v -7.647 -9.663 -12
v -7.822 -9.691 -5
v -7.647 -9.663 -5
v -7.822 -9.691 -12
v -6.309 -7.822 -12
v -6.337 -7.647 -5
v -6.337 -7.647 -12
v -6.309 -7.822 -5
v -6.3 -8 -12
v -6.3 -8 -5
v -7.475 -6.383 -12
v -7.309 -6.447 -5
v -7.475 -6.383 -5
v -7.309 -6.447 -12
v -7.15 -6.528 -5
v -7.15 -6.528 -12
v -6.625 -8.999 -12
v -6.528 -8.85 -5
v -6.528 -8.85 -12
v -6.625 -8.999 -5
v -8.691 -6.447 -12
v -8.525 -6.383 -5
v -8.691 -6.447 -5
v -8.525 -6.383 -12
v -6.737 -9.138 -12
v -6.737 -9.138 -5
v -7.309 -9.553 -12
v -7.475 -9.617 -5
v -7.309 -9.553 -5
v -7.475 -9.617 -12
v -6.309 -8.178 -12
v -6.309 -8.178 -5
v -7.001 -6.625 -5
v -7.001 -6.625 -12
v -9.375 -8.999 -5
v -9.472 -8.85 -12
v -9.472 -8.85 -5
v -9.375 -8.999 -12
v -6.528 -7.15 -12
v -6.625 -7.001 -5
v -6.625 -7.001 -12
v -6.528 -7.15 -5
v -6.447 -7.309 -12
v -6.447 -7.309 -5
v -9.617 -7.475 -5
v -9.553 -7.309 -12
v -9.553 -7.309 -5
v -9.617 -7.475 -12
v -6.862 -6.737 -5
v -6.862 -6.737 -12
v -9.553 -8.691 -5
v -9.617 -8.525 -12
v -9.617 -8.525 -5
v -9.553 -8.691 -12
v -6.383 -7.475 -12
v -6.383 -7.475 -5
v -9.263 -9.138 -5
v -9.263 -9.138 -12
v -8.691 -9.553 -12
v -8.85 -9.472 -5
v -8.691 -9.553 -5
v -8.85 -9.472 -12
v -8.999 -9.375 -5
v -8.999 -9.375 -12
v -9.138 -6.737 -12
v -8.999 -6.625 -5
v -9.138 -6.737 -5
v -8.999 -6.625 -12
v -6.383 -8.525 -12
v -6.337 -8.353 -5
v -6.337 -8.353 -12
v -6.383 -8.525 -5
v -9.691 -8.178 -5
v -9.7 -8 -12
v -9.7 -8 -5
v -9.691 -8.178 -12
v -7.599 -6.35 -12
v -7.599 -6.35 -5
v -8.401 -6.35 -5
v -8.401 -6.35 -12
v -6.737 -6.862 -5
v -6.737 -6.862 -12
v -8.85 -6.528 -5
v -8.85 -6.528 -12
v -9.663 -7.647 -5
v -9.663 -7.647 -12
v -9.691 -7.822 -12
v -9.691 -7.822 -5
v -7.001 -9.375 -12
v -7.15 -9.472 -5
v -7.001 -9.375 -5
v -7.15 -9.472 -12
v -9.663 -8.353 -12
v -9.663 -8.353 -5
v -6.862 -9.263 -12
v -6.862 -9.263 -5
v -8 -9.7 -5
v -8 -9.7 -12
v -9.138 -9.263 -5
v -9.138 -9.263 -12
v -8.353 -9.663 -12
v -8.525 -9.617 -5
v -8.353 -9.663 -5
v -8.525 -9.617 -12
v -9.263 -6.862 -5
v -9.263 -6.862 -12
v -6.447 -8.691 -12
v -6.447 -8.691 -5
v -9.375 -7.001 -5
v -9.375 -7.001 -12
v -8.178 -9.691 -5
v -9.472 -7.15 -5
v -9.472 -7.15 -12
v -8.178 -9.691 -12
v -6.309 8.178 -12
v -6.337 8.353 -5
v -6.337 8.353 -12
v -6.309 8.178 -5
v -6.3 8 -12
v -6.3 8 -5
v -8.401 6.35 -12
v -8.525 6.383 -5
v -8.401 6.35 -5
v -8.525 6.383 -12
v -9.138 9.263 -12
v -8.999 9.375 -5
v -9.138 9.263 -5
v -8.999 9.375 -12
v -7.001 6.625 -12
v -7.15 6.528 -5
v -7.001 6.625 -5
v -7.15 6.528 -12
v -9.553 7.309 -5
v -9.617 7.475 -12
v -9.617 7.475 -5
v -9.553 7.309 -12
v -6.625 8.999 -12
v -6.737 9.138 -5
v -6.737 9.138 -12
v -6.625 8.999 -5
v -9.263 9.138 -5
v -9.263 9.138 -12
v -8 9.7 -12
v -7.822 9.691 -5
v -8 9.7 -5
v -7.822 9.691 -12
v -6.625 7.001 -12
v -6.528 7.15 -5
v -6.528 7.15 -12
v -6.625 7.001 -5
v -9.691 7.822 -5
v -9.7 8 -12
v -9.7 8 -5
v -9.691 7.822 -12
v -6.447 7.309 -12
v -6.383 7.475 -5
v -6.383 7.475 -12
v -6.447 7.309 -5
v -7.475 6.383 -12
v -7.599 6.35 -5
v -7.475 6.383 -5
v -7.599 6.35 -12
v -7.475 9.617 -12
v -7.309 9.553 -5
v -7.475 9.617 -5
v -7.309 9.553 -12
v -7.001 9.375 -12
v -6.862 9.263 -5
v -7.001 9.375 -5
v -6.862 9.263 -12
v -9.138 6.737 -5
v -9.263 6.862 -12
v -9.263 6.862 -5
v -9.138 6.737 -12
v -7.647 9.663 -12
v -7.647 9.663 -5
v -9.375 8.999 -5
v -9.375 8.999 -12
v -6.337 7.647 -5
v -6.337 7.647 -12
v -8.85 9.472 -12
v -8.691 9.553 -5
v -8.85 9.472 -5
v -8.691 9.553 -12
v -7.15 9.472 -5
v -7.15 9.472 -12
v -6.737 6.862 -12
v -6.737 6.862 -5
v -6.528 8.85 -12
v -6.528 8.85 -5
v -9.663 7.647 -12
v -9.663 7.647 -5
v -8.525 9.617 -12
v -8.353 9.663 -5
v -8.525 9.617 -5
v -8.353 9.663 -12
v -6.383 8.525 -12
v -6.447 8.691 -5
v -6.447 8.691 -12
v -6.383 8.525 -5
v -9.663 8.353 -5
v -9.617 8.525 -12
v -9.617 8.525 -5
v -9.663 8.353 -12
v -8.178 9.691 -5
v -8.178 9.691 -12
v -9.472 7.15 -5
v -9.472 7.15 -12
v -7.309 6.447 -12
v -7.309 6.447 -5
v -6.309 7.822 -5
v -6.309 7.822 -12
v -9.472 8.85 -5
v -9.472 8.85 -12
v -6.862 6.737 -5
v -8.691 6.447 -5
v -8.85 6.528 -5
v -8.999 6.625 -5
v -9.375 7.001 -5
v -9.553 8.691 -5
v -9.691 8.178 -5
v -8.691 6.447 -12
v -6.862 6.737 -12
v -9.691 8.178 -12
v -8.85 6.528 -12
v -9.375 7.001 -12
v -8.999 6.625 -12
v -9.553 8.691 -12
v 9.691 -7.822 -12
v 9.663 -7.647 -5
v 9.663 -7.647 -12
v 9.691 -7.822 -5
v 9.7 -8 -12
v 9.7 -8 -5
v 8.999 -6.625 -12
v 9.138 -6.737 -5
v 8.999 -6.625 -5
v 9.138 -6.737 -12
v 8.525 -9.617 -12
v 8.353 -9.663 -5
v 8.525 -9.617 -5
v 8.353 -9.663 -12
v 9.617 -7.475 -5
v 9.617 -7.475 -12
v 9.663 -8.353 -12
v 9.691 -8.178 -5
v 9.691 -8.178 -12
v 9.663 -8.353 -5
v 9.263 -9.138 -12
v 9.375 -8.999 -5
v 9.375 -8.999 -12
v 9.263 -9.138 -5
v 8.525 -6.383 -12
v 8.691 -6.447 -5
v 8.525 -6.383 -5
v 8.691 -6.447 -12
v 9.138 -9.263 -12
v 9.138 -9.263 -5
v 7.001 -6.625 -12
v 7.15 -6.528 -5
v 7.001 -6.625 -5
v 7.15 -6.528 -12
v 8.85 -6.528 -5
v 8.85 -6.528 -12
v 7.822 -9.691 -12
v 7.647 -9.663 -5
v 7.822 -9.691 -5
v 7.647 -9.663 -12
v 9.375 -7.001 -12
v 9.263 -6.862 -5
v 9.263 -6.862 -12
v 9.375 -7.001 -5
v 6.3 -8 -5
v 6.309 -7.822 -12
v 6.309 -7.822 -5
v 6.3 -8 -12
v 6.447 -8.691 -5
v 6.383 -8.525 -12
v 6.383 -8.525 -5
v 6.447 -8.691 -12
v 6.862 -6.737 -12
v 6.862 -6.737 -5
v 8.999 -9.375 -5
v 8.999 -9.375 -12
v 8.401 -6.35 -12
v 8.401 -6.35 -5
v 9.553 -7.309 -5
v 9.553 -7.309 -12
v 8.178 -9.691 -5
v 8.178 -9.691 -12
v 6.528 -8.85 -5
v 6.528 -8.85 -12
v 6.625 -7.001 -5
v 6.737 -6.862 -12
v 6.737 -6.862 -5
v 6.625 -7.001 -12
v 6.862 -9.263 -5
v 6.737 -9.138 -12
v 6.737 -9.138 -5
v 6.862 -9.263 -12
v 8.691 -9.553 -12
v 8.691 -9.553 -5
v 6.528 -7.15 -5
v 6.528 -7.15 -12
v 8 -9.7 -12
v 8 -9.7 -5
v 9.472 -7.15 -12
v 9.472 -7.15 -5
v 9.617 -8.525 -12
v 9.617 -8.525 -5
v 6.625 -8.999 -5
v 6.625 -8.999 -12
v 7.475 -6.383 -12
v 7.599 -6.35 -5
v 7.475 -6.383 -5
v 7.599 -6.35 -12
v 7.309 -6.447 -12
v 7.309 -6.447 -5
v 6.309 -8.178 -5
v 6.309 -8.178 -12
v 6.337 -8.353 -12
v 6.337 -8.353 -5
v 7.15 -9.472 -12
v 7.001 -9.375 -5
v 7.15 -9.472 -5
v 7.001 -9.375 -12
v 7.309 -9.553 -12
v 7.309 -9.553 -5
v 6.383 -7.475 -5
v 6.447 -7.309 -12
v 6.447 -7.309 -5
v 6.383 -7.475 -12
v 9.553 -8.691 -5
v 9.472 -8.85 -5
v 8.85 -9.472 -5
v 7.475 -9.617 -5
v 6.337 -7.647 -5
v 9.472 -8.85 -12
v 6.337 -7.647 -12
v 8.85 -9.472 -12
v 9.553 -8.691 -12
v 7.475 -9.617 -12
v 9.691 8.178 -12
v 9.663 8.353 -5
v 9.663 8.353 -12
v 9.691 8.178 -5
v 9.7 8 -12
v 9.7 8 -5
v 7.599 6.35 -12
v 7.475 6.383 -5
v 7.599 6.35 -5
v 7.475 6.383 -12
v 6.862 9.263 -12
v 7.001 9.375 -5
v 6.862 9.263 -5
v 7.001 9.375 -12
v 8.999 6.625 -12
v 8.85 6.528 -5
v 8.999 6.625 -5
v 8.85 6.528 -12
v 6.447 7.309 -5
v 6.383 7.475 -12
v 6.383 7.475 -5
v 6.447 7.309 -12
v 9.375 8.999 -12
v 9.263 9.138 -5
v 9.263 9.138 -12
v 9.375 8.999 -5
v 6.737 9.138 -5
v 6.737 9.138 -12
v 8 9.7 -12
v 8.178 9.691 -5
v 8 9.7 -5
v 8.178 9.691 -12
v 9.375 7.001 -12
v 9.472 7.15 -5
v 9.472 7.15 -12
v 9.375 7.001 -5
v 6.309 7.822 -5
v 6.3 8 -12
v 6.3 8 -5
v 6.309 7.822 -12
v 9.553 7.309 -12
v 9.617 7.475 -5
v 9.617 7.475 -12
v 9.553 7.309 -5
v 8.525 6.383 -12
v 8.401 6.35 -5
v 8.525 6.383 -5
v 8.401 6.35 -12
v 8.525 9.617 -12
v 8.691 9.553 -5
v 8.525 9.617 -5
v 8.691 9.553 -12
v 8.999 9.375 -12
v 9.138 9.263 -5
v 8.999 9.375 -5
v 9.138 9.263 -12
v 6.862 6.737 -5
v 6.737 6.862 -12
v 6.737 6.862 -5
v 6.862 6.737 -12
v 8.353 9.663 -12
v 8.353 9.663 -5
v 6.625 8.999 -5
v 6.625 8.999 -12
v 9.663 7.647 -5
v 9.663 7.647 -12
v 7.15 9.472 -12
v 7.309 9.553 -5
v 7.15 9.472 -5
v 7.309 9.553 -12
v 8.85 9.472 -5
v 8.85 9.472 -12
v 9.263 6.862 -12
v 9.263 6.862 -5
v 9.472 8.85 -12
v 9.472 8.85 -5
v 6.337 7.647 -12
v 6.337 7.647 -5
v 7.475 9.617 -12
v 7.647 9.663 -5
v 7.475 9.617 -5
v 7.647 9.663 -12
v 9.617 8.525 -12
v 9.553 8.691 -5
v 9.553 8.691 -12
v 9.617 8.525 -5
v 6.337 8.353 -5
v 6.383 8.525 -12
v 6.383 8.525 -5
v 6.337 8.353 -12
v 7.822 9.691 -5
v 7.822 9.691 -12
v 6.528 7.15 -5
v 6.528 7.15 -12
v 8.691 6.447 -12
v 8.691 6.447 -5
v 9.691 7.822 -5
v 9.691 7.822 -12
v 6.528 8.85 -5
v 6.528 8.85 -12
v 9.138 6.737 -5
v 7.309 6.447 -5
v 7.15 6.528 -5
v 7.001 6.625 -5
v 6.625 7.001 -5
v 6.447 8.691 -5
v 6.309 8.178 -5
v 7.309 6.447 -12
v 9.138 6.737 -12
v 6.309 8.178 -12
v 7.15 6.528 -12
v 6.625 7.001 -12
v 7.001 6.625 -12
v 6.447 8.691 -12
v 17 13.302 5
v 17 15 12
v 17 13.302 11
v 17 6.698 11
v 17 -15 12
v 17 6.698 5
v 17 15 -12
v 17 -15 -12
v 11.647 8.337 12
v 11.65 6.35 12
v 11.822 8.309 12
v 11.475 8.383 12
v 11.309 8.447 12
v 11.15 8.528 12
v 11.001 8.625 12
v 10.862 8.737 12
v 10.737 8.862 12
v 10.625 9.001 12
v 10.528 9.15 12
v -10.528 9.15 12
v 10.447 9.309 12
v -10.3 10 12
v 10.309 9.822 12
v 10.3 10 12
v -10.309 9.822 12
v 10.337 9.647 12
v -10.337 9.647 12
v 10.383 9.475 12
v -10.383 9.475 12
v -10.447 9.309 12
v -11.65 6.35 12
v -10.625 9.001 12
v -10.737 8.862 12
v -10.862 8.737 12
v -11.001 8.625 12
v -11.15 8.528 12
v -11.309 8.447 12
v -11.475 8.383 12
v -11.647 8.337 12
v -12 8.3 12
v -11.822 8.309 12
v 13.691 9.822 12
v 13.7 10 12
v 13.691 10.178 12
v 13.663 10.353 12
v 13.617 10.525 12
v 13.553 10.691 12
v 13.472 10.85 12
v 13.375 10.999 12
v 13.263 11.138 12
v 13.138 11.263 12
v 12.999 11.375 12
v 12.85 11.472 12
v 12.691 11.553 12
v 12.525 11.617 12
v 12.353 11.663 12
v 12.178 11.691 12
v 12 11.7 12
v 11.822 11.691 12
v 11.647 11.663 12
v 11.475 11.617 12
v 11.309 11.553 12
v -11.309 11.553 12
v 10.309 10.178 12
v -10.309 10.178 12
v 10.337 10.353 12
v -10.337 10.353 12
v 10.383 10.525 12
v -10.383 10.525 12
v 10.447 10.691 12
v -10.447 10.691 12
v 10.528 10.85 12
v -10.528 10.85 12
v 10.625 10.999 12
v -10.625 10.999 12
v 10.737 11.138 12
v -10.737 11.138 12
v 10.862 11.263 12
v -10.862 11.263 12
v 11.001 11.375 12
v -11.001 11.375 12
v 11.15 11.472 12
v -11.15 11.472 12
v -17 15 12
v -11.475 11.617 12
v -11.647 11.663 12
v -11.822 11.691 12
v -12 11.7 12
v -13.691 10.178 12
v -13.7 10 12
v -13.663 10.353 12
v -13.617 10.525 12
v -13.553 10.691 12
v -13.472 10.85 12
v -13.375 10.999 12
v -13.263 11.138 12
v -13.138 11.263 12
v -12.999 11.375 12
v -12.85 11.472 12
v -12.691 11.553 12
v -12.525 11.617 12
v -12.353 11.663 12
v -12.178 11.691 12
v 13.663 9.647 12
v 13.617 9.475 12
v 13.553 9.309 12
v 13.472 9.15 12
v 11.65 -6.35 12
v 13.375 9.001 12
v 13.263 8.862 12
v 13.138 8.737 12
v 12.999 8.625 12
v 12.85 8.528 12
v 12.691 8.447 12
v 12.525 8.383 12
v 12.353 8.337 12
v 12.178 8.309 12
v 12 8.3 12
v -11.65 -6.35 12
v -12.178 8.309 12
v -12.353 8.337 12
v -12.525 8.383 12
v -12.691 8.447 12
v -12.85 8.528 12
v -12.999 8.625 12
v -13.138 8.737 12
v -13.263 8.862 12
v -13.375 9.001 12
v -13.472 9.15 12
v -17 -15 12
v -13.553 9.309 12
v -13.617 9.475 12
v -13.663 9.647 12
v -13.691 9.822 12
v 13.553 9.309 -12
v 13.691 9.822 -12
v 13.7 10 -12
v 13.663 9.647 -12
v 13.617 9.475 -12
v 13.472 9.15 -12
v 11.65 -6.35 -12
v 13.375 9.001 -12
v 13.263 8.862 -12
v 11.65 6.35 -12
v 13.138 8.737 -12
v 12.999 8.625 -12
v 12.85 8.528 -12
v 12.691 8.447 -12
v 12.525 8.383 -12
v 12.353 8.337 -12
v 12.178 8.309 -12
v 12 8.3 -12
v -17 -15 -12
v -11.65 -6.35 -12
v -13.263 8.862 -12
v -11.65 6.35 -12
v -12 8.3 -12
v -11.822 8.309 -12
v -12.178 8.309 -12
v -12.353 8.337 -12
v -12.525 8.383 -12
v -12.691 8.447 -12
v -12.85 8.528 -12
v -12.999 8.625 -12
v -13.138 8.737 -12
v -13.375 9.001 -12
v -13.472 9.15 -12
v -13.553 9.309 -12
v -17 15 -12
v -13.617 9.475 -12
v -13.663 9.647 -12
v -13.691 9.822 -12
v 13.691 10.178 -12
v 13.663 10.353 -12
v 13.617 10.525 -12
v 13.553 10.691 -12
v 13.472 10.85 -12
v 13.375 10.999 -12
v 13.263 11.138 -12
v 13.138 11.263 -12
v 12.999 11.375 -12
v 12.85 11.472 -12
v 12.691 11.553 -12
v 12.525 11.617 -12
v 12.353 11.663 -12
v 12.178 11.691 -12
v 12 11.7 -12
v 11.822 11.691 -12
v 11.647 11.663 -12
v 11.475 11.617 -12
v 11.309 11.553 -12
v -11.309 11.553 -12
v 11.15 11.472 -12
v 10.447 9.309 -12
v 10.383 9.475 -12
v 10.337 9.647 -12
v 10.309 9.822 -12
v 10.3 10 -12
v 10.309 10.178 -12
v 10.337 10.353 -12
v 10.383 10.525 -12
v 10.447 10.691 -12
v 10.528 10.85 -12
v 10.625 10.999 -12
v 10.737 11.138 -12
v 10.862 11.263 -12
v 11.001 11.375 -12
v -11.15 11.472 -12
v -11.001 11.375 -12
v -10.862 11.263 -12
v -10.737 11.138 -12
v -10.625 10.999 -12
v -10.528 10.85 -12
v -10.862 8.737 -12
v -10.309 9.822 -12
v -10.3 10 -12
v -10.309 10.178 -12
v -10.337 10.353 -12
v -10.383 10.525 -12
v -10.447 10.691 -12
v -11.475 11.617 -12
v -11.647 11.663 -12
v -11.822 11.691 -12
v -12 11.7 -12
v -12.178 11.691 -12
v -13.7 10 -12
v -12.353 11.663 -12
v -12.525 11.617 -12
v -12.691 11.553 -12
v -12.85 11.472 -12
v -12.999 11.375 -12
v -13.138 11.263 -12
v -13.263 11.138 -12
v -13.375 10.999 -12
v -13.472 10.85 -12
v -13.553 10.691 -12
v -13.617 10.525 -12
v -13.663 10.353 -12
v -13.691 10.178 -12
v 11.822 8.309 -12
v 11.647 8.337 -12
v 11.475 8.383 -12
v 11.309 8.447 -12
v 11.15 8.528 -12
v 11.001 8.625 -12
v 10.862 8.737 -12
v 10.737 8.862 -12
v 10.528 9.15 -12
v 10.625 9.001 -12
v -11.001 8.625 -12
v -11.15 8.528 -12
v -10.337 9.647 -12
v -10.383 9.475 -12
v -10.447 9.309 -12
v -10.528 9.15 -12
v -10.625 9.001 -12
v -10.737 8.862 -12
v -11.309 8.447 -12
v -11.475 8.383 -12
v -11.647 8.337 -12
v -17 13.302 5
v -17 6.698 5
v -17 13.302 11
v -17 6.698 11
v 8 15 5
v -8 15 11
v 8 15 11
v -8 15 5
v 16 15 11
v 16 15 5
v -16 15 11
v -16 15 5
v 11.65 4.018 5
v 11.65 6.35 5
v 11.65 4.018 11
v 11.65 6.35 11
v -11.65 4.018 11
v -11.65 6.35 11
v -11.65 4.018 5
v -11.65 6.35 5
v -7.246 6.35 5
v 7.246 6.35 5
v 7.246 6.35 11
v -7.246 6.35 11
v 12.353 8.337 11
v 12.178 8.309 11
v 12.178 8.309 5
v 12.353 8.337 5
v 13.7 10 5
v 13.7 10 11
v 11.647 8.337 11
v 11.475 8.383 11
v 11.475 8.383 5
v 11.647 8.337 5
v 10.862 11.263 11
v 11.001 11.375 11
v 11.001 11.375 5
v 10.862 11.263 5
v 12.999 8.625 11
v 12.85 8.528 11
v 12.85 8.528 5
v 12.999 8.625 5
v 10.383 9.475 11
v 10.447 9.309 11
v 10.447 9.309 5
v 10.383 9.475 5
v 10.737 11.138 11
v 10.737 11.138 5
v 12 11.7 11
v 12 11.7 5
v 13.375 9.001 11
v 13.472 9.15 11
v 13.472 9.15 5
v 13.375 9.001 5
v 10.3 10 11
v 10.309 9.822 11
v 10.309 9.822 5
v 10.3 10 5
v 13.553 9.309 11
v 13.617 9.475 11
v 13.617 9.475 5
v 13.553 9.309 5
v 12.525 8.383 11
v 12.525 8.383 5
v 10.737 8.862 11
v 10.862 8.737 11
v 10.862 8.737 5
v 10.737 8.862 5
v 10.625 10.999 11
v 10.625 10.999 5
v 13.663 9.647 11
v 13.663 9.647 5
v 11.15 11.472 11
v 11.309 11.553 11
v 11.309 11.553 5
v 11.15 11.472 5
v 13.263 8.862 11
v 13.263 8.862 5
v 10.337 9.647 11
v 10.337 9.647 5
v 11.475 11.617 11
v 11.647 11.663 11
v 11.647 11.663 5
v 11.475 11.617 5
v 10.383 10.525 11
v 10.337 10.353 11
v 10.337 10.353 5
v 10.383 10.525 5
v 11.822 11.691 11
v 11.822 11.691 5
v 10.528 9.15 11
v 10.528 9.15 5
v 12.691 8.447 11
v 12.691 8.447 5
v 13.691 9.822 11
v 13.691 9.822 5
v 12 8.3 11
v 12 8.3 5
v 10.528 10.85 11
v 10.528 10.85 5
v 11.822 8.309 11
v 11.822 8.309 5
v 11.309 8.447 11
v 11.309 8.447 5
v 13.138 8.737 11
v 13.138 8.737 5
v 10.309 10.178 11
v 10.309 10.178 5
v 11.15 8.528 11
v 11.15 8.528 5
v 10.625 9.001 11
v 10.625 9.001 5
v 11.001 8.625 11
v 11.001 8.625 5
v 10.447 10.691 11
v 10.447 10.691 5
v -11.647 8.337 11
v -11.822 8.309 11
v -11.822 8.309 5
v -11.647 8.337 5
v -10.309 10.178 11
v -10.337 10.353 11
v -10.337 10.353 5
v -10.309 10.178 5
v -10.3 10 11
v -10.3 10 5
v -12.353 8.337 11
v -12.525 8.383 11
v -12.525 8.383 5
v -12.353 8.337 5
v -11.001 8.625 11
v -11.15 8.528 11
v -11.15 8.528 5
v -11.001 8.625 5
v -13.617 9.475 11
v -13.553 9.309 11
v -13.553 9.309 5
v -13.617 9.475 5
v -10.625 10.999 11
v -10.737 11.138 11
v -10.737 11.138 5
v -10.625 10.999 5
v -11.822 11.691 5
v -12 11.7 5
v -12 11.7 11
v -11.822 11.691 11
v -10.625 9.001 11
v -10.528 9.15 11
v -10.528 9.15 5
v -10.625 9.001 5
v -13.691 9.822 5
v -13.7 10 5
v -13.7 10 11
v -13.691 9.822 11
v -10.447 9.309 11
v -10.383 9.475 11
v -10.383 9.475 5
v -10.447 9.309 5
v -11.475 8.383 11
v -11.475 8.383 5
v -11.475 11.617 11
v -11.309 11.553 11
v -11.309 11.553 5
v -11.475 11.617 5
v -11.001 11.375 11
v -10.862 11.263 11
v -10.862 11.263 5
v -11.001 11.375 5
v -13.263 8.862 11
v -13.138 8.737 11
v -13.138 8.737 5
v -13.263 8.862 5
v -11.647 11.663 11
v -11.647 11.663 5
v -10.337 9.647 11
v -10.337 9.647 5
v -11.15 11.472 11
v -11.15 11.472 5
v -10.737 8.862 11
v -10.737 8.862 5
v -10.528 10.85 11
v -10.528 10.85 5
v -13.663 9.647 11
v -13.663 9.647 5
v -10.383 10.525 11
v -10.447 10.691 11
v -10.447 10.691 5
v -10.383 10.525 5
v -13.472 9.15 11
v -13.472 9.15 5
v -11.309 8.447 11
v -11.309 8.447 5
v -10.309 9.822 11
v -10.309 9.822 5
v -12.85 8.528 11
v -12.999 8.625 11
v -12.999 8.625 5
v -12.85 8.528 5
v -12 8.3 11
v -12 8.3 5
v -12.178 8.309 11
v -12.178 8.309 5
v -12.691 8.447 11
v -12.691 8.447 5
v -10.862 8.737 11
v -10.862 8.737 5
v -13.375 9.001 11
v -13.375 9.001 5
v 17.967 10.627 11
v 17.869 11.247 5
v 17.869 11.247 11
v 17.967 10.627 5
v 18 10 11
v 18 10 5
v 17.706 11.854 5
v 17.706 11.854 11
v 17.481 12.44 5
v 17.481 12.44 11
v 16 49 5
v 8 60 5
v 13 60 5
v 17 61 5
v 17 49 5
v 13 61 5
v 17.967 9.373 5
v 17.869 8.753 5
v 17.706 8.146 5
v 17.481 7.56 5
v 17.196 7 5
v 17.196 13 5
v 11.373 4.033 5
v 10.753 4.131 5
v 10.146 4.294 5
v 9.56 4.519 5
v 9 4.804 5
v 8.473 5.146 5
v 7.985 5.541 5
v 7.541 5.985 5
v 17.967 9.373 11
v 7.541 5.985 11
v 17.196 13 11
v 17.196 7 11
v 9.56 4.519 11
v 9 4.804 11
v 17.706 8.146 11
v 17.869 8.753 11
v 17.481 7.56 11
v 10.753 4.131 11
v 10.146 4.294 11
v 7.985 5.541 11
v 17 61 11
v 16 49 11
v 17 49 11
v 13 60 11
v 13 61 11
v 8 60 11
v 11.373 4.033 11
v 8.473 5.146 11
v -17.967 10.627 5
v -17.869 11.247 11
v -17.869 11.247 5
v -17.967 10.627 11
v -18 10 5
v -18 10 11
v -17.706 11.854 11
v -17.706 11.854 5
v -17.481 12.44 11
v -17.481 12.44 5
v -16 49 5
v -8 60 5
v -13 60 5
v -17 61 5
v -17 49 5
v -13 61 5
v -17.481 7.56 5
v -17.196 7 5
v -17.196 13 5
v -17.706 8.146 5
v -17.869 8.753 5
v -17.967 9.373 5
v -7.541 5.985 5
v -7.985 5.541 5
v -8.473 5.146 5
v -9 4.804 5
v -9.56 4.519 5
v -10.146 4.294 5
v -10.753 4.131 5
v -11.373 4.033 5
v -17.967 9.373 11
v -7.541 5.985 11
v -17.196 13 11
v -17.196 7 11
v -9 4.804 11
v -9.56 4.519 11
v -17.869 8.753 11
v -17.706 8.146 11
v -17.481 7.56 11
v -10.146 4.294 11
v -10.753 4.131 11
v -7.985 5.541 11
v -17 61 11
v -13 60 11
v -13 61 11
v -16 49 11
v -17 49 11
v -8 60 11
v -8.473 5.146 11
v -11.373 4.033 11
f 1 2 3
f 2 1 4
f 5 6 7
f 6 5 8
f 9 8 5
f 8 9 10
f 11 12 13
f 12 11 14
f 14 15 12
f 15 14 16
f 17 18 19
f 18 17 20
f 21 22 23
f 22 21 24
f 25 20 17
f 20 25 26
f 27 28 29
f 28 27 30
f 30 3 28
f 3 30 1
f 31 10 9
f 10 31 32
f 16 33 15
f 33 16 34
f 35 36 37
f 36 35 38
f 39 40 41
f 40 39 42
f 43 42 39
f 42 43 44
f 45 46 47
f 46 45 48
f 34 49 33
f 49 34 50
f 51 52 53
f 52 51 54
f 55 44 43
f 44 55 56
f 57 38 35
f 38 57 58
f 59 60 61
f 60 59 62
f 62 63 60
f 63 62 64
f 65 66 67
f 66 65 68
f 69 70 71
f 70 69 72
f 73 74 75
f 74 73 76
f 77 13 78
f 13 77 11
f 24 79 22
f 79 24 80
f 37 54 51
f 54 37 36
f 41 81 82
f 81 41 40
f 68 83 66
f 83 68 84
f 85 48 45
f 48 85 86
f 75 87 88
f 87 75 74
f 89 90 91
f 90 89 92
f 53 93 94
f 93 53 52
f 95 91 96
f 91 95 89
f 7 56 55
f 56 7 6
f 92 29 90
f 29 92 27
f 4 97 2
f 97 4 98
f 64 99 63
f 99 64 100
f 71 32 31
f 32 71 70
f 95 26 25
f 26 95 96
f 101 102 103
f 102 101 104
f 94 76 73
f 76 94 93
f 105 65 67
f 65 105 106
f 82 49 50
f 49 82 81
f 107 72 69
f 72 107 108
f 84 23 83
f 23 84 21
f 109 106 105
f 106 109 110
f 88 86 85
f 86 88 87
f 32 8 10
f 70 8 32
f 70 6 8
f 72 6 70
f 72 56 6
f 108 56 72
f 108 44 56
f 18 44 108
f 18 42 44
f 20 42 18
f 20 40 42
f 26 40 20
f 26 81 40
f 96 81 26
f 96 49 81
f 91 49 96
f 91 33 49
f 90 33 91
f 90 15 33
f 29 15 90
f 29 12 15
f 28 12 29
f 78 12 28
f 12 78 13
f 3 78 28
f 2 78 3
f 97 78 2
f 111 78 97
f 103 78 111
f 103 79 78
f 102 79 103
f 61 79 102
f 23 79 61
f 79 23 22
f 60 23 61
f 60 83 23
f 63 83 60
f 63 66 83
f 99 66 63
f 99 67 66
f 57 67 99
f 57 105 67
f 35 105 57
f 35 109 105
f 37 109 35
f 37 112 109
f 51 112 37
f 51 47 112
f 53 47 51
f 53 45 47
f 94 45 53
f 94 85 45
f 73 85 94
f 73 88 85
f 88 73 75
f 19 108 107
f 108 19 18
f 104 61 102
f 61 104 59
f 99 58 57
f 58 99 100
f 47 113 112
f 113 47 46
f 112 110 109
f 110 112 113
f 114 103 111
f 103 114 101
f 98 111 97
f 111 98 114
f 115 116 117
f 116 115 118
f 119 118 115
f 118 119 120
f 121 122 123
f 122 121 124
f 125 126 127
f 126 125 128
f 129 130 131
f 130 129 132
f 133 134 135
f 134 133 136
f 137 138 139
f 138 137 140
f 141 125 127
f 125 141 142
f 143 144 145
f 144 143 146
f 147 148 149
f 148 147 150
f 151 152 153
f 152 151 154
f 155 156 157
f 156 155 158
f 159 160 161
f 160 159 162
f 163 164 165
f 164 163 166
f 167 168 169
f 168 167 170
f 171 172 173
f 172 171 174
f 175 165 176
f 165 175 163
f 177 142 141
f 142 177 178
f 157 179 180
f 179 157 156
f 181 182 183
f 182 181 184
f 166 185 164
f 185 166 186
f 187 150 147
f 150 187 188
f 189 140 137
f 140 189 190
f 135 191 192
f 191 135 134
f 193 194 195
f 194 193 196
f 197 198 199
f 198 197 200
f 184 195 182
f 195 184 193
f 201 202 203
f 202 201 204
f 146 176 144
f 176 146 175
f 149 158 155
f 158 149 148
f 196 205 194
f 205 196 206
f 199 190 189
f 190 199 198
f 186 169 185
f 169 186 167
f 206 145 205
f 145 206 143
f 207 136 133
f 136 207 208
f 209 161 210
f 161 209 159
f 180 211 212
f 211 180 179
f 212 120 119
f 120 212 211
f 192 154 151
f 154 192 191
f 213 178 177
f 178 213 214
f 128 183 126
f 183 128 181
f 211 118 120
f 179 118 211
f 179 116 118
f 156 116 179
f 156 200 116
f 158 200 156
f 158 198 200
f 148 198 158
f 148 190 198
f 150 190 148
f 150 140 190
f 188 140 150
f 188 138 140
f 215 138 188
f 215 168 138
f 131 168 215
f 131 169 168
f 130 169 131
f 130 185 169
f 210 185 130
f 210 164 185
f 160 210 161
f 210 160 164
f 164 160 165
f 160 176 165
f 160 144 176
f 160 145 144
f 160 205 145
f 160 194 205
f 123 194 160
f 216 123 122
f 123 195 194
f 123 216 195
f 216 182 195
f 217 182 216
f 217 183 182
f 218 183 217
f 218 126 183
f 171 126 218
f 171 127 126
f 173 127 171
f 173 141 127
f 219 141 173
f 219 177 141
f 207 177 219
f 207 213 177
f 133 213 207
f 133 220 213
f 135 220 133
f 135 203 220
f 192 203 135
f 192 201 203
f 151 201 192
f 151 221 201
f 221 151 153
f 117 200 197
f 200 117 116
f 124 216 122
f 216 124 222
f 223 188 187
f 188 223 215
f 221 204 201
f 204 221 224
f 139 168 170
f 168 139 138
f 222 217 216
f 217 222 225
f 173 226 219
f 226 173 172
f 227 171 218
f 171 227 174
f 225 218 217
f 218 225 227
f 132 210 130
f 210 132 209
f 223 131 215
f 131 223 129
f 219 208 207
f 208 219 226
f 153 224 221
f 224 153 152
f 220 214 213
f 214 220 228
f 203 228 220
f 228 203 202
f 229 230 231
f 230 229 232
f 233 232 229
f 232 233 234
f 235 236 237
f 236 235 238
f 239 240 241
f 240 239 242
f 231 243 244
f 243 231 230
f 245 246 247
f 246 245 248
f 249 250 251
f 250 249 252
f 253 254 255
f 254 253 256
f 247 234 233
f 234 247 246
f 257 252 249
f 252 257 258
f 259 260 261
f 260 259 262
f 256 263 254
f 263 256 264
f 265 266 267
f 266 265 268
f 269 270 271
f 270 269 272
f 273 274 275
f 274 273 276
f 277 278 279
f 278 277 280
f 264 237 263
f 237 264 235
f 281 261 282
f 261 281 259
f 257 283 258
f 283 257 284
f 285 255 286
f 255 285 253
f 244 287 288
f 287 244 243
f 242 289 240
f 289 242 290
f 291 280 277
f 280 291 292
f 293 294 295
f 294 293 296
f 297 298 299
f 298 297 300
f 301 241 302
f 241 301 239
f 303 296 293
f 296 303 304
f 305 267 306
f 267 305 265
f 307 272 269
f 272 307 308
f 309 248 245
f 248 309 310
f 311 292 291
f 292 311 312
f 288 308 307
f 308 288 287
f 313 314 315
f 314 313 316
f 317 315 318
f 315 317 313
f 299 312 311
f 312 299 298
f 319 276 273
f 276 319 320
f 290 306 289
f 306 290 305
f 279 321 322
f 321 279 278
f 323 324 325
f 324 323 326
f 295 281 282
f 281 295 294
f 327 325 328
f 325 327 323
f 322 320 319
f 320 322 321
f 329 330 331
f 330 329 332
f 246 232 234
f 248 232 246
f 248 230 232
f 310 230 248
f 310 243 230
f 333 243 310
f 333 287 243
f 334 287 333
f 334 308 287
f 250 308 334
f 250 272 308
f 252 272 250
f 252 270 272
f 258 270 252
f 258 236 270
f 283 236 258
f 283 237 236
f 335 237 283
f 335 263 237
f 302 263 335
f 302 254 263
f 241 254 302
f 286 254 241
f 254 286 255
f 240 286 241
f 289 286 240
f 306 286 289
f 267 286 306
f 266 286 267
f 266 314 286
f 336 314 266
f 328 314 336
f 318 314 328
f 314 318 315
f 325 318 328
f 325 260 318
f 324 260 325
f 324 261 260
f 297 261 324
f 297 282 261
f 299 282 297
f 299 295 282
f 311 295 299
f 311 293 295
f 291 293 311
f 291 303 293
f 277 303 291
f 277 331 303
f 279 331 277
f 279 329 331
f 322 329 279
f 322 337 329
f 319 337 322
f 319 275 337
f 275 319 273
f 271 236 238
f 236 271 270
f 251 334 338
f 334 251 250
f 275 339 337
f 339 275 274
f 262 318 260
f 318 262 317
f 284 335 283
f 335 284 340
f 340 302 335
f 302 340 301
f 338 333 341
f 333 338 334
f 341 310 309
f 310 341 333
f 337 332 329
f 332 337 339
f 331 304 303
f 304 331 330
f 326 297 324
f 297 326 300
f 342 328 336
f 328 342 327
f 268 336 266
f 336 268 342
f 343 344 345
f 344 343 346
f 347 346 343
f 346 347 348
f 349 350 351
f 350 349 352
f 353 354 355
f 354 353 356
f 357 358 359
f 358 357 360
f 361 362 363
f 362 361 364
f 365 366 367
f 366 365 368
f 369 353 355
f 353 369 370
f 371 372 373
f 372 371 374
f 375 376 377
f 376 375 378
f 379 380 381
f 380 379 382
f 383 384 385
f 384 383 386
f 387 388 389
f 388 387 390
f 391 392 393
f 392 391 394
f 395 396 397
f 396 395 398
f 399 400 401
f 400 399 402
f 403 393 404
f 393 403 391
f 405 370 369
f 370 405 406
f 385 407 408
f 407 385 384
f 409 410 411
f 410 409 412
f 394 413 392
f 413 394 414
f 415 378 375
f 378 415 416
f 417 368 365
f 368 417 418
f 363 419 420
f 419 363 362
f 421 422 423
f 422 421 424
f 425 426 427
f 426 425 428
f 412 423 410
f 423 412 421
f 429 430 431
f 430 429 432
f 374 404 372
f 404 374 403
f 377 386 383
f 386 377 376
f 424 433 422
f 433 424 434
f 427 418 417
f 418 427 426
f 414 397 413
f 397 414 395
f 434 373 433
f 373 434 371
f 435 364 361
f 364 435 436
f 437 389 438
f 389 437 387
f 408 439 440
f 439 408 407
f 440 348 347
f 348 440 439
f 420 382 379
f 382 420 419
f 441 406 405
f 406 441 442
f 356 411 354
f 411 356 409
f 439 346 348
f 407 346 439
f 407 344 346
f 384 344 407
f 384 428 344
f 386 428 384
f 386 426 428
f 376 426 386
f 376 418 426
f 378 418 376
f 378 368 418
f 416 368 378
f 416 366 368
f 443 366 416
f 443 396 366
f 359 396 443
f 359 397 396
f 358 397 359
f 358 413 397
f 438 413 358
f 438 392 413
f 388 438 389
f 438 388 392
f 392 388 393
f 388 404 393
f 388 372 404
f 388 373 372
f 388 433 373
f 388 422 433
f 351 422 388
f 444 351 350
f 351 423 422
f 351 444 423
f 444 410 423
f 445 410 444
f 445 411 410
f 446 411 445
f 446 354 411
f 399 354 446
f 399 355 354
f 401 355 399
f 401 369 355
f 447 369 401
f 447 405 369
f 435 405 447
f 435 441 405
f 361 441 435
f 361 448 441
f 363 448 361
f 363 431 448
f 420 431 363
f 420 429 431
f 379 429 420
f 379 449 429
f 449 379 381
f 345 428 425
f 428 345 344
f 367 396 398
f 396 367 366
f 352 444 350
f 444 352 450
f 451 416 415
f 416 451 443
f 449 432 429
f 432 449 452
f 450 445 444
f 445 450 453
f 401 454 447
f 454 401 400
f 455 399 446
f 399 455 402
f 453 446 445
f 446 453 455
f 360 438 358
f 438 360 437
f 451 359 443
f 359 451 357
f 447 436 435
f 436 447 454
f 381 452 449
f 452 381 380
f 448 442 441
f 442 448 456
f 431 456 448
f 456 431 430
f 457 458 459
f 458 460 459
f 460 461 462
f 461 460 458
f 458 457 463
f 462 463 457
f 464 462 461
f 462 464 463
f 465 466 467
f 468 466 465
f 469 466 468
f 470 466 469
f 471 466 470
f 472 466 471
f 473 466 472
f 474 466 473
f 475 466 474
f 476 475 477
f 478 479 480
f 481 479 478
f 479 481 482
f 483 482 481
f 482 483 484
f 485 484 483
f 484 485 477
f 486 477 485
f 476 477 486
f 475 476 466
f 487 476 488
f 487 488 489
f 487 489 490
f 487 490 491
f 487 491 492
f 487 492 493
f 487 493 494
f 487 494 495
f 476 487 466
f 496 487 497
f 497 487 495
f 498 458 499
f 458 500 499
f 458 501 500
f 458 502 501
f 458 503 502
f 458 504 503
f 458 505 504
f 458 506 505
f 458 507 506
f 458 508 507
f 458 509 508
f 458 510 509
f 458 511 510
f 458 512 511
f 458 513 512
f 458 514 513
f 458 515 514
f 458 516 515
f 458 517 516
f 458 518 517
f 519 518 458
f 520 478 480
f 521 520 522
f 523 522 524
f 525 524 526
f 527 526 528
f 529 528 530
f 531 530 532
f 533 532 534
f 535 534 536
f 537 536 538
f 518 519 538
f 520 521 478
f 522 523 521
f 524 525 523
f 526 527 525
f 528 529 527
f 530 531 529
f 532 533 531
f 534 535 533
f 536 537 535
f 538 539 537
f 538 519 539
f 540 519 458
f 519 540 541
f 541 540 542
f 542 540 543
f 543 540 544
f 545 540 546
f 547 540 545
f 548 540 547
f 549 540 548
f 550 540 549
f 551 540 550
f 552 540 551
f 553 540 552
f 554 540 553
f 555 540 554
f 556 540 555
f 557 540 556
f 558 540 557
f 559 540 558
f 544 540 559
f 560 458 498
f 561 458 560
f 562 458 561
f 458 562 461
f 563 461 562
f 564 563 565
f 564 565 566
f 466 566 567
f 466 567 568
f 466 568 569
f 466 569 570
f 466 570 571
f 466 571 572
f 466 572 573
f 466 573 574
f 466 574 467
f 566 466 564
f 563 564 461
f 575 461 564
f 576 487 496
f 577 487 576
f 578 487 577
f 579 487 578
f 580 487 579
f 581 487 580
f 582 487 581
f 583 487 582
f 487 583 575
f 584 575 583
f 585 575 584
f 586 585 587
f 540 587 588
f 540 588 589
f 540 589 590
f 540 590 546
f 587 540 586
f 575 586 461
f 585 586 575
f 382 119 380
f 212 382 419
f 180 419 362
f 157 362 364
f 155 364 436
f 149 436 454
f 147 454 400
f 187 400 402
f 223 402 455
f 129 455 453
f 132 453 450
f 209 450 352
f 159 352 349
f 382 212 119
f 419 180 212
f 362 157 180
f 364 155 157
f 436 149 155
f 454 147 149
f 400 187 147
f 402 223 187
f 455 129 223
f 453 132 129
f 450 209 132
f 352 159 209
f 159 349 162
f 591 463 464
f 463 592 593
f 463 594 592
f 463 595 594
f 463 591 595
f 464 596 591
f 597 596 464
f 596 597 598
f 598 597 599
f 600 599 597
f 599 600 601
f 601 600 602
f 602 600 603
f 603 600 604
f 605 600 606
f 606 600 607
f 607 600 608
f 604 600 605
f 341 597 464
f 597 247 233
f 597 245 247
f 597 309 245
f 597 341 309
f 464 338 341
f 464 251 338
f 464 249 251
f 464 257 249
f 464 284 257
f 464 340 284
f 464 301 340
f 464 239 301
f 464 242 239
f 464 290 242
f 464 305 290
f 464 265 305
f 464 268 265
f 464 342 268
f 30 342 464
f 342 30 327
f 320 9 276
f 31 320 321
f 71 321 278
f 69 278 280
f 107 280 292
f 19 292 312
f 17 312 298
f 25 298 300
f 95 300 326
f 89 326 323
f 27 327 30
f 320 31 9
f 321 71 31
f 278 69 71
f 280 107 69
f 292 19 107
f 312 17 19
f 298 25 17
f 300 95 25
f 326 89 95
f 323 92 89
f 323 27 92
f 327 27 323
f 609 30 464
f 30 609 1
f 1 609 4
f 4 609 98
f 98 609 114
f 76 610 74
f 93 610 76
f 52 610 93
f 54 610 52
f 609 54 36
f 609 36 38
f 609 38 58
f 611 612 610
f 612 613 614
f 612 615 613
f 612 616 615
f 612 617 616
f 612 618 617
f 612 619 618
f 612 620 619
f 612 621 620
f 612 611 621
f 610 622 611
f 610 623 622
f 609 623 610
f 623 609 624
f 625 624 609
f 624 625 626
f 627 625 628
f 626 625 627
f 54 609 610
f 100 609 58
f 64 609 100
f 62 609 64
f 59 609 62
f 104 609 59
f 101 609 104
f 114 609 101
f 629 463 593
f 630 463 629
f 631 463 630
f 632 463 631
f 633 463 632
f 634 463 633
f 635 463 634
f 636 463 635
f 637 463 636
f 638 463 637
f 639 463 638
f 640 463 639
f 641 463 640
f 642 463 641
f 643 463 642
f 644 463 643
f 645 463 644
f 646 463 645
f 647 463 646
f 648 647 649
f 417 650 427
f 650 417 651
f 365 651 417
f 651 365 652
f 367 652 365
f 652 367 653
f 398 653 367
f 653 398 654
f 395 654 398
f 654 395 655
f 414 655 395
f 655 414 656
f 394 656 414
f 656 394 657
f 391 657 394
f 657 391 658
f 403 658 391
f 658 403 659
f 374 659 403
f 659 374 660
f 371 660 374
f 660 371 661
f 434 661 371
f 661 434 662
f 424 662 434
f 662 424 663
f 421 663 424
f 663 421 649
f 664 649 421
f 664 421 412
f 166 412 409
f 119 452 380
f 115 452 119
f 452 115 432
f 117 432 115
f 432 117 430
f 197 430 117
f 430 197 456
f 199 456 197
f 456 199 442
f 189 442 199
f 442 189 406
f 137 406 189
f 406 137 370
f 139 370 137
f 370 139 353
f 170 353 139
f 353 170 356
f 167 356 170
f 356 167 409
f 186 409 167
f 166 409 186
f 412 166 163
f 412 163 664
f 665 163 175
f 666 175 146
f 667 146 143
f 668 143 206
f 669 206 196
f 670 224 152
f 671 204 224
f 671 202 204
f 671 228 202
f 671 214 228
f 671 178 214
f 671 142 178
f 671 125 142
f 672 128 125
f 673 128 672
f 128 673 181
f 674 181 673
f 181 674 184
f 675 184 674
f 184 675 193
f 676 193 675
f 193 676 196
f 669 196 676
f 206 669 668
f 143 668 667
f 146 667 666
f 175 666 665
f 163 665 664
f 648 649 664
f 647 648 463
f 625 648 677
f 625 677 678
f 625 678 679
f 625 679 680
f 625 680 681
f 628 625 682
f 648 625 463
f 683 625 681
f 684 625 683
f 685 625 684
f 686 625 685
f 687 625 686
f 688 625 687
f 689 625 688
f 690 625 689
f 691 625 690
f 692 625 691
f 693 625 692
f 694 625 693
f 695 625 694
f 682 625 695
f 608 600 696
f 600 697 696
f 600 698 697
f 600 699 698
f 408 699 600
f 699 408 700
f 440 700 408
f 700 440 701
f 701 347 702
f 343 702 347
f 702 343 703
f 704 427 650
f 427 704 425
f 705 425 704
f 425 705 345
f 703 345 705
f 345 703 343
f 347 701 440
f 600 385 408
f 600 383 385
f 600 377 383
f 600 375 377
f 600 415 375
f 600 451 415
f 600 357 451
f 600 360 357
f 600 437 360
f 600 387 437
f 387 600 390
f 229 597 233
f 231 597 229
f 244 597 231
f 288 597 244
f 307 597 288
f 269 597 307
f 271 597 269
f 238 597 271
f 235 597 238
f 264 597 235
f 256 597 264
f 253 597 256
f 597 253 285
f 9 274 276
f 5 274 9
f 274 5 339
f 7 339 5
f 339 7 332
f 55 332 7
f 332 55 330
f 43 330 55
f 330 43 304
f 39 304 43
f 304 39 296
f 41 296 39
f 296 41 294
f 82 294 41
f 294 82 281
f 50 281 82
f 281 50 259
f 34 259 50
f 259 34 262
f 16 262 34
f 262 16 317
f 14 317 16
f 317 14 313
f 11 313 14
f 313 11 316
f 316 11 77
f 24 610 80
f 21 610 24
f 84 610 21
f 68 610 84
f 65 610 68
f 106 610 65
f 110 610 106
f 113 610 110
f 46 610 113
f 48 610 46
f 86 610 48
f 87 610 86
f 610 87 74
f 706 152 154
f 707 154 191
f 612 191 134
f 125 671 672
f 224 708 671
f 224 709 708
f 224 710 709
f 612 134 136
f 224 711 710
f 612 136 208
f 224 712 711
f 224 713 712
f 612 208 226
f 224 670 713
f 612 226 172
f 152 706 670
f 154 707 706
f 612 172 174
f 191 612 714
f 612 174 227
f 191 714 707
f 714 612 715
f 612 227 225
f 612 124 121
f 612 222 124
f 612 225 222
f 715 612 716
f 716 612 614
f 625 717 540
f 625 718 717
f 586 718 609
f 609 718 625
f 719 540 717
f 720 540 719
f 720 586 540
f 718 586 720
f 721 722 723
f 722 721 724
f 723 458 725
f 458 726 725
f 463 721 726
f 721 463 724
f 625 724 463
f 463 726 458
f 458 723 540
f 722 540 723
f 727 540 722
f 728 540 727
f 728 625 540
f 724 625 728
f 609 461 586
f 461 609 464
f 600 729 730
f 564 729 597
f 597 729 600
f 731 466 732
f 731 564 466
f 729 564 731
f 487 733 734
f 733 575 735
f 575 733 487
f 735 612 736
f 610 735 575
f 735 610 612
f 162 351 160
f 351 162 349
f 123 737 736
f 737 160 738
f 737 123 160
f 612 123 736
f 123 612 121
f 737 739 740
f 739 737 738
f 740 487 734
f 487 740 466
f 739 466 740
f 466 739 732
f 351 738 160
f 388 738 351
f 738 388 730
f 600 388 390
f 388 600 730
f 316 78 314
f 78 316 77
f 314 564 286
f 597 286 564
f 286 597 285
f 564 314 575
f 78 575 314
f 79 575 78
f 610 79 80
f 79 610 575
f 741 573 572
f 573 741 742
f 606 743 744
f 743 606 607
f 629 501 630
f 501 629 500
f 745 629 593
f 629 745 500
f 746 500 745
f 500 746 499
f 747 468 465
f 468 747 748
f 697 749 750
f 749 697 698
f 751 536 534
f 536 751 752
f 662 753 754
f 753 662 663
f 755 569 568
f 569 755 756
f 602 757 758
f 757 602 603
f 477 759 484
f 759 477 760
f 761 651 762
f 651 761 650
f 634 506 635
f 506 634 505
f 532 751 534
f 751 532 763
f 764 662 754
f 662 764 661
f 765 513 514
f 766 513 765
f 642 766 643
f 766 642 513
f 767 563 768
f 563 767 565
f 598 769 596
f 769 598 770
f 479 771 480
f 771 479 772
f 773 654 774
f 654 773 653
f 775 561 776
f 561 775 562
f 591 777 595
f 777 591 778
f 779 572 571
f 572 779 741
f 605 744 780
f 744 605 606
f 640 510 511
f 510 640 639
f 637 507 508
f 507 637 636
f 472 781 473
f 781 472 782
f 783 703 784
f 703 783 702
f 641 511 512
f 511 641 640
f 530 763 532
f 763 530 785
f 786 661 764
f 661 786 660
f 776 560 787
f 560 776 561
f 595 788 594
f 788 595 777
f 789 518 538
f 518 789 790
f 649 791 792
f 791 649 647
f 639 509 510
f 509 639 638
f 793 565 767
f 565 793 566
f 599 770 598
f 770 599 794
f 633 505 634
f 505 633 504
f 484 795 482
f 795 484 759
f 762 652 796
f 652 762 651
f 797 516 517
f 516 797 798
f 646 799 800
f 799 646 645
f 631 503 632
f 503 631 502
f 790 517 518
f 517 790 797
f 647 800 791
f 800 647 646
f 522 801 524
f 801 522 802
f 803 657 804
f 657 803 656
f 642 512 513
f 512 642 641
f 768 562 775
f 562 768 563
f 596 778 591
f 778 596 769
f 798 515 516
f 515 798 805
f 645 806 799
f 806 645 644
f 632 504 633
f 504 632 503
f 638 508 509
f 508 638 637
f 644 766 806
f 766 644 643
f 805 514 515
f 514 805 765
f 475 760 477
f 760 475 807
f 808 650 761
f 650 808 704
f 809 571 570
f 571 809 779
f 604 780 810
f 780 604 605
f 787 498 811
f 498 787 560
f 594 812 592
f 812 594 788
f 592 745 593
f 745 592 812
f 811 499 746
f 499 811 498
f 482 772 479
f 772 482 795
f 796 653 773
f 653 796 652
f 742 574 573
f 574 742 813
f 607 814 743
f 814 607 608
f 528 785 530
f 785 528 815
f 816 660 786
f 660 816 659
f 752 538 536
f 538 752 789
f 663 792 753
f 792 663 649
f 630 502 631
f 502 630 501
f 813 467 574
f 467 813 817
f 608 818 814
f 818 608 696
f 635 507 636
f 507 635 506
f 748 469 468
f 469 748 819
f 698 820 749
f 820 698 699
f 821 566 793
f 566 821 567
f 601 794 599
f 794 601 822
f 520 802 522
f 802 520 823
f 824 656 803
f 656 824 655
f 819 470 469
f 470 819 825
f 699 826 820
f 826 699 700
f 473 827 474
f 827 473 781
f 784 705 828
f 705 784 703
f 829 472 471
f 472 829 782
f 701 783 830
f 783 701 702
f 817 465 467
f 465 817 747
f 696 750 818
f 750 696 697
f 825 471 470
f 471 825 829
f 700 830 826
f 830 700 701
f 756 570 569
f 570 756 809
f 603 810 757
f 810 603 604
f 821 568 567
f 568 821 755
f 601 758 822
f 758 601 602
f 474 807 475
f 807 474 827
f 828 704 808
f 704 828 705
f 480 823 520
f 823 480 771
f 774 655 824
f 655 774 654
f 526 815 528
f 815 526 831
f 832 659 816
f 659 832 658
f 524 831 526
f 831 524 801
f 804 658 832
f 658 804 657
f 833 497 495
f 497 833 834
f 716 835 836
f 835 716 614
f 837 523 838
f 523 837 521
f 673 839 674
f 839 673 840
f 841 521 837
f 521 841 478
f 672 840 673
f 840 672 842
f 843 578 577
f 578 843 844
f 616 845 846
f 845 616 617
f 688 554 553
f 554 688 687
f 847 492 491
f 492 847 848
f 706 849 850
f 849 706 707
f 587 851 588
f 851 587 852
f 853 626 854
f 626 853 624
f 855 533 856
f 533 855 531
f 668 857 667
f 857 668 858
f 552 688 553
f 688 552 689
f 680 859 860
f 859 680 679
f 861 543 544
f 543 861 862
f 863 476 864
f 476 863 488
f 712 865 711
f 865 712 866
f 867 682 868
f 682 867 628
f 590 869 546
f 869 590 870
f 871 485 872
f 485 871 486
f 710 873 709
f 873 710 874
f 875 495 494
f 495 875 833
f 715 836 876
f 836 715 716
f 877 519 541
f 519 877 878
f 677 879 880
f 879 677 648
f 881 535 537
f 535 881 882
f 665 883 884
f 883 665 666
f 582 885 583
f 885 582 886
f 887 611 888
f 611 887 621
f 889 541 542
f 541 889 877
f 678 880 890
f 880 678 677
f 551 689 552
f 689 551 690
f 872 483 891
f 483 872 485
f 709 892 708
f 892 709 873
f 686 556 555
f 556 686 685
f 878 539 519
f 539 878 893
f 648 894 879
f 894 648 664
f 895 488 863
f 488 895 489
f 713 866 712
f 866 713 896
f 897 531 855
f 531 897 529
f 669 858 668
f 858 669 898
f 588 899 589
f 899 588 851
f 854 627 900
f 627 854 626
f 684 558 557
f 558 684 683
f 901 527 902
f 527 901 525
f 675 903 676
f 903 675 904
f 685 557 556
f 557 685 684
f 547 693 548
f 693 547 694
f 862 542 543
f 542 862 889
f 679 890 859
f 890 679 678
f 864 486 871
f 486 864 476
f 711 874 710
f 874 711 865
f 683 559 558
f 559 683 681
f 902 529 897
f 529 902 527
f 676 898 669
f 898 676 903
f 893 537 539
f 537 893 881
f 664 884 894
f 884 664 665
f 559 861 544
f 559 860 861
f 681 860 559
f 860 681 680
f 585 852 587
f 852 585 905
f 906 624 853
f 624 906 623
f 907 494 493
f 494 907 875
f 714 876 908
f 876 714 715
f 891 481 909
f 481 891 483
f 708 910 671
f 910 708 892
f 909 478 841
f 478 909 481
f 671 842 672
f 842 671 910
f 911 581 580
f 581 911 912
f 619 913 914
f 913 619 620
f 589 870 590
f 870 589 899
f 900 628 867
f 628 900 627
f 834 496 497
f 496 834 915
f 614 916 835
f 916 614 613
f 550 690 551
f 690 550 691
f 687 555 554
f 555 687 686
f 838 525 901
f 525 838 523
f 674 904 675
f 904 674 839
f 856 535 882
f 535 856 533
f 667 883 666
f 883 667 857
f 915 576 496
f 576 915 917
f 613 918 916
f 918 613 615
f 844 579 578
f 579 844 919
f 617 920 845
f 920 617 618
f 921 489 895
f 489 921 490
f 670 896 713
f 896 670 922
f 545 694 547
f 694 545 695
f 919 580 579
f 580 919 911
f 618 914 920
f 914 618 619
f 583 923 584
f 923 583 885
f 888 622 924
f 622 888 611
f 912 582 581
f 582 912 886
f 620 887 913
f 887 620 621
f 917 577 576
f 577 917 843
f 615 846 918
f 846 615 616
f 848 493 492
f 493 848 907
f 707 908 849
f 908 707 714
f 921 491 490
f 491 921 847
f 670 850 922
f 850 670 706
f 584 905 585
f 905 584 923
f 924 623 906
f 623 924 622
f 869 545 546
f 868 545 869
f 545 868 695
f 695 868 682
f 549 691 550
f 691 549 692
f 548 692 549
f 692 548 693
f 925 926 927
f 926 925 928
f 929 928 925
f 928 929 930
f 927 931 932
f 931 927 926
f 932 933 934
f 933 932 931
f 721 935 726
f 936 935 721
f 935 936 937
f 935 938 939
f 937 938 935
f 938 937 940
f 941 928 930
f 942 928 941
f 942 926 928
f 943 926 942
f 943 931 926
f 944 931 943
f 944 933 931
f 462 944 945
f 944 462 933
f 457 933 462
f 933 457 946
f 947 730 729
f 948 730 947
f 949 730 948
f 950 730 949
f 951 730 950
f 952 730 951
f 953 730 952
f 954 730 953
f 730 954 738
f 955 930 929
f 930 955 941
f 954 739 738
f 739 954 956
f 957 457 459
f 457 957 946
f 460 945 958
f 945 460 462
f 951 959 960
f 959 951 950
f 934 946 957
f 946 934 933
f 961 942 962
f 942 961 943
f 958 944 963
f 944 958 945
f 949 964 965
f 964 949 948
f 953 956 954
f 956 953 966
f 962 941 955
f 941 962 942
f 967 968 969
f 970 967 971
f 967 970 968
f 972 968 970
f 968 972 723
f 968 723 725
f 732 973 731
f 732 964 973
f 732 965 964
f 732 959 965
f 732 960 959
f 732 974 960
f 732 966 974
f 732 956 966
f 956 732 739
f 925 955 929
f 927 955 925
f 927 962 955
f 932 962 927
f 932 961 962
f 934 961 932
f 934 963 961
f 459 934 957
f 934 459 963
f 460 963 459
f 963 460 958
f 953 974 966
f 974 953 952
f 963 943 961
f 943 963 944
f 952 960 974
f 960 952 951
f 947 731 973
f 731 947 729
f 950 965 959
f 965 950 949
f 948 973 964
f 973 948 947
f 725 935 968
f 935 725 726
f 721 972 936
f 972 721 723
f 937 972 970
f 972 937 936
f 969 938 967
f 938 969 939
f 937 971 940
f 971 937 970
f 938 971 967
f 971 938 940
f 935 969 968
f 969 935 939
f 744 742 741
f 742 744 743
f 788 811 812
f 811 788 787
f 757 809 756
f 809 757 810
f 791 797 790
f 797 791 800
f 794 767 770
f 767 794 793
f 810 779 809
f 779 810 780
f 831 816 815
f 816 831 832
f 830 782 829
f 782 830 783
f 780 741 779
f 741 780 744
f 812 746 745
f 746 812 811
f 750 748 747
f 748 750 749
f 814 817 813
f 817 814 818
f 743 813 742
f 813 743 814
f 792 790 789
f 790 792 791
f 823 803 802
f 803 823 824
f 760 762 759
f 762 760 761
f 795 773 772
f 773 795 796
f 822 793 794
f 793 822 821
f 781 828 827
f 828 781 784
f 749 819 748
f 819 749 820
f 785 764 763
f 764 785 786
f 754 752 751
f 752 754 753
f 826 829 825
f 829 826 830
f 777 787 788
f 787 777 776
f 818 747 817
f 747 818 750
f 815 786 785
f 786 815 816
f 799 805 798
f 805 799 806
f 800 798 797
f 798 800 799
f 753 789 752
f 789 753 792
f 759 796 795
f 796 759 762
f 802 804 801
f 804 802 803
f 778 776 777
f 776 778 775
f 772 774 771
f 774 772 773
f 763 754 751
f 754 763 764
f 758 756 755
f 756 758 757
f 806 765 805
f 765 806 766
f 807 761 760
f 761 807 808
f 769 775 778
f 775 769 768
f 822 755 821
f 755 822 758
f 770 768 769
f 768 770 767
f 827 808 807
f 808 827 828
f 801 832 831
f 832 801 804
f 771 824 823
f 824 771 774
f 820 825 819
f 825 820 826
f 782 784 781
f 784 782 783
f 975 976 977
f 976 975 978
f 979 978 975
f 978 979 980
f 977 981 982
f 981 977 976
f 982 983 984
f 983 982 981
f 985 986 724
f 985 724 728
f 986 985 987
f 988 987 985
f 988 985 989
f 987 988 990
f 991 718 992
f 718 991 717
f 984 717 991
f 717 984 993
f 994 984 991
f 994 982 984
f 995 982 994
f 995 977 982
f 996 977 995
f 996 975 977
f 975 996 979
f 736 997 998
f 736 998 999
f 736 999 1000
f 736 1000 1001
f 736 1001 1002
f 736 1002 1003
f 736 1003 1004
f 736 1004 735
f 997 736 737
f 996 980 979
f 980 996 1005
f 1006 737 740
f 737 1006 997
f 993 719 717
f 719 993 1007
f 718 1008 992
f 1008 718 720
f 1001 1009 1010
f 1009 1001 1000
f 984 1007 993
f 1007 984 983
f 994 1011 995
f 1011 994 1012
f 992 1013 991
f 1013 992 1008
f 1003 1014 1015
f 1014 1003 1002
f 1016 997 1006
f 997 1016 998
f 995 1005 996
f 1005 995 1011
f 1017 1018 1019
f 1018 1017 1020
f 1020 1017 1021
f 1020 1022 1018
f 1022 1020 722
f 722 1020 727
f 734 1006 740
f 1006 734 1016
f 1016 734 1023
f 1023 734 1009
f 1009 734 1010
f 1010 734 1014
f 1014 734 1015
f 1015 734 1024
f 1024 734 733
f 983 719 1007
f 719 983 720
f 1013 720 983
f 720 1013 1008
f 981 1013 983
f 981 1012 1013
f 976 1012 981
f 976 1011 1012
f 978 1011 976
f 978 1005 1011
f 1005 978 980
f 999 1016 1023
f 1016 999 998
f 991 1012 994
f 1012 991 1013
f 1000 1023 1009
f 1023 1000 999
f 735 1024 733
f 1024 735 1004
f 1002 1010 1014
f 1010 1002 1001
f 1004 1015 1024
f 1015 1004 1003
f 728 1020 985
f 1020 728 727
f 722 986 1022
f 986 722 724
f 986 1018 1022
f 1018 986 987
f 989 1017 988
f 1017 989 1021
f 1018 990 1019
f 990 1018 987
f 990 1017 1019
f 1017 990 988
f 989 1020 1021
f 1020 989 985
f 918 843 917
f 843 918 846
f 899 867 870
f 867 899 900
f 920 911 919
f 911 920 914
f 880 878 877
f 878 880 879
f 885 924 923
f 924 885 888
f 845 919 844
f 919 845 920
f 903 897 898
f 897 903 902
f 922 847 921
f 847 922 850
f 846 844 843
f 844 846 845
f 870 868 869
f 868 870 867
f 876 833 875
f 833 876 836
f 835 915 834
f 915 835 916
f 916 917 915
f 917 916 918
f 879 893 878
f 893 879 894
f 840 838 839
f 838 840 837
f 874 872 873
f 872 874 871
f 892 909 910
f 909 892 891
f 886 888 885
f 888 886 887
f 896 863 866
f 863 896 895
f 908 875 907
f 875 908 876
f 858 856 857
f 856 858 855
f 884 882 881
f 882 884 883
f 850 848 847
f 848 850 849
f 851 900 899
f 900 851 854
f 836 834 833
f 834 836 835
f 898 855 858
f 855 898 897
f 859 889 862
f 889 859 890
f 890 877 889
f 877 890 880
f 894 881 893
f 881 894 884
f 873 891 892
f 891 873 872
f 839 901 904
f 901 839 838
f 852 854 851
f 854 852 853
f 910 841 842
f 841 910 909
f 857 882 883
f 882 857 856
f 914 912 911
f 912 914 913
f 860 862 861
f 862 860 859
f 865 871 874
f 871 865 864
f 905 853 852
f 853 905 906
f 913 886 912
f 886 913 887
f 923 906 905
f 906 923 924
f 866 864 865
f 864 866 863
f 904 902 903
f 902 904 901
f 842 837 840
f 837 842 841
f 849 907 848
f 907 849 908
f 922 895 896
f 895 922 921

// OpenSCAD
// file: parameters.scad
// Bhujaha (भुजः) — Global CAD Parameters
// All units in millimeters (mm)

$fn = 60; // Curve resolution

// Joint Link Lengths
L_BASE_HEIGHT     = 65.0;   // Ground to Shoulder joint axis
L_SHOULDER_LINK   = 180.0;  // Shoulder to Elbow axis
L_FOREARM_LINK    = 180.0;  // Elbow to Wrist/Gripper mount
L_GRIPPER_REACH   = 60.0;   // Gripper reach

// Hardware Dimensions (Standard Off-The-Shelf)
BEARING_608_OD    = 22.2;   // 608RS outer diameter (with tolerance)
BEARING_608_ID    = 8.0;    // 608RS inner bore
BEARING_608_WIDTH = 7.0;    // 608RS thickness

// Fasteners
M3_HOLE           = 3.4;    // Clearance for M3 screw
M3_NUT_HEX        = 6.2;    // M3 hex nut slot width
M4_HOLE           = 4.4;    // Clearance for M4 screw
M4_NUT_HEX        = 7.8;    // M4 hex nut slot width

// Serial Bus Servo Specs (Feetech STS3215 / SCS15 standard envelope)
SERVO_LENGTH      = 45.2;
SERVO_WIDTH       = 24.7;
SERVO_HEIGHT      = 35.0;
SERVO_HORN_RADIUS = 10.0;
SERVO_MOUNT_SPACING_X = 48.5;
SERVO_MOUNT_SPACING_Y = 10.0;

// Wall Thickness & Tolerances
WALL_THICKNESS    = 4.0;
TOLERANCE         = 0.3;    // 3D printer clearance
// main file
// Bhujaha (भुजः) — End-Effector / Micro Parallel Jaw Gripper
include <parameters.scad>;

// Micro servo (MG90S / SG90) dimensions
SERVO_MICRO_L = 22.8;
SERVO_MICRO_W = 12.2;
SERVO_MICRO_H = 28.5;

module gripper_base() {
    difference() {
        // Main gripper bracket body
        cube([34, 30, 24], center=true);

        // Micro servo pocket
        translate([0, 0, 2])
            cube([SERVO_MICRO_L + 0.5, SERVO_MICRO_W + 0.5, SERVO_MICRO_H], center=true);

        // Arm attachment bolt holes
        for (dx = [-8, 8]) {
            for (dy = [-8, 8]) {
                translate([dx, dy, -10])
                    cylinder(r=M3_HOLE / 2, h=10, center=true);
            }
        }

        // Jaw pivot axle holes
        translate([12, 10, 0]) cylinder(r=M3_HOLE / 2, h=30, center=true);
        translate([-12, 10, 0]) cylinder(r=M3_HOLE / 2, h=30, center=true);
    }
}

module gripper_finger() {
    difference() {
        union() {
            // Pivot hub
            cylinder(r=6, h=6, center=true);

            // Finger tip with compliant grip surface
            translate([0, 25, 0])
                cube([8, 50, 6], center=true);

            // Grip pad
            translate([3, 45, 0])
                cube([4, 12, 6], center=true);
        }

        // Pivot bolt hole
        cylinder(r=M3_HOLE / 2, h=10, center=true);
    }
}

// Standalone render
gripper_base();
translate([12, 10, 8]) gripper_finger();
translate([-12, 10, 8]) mirror([1, 0, 0]) gripper_finger();
